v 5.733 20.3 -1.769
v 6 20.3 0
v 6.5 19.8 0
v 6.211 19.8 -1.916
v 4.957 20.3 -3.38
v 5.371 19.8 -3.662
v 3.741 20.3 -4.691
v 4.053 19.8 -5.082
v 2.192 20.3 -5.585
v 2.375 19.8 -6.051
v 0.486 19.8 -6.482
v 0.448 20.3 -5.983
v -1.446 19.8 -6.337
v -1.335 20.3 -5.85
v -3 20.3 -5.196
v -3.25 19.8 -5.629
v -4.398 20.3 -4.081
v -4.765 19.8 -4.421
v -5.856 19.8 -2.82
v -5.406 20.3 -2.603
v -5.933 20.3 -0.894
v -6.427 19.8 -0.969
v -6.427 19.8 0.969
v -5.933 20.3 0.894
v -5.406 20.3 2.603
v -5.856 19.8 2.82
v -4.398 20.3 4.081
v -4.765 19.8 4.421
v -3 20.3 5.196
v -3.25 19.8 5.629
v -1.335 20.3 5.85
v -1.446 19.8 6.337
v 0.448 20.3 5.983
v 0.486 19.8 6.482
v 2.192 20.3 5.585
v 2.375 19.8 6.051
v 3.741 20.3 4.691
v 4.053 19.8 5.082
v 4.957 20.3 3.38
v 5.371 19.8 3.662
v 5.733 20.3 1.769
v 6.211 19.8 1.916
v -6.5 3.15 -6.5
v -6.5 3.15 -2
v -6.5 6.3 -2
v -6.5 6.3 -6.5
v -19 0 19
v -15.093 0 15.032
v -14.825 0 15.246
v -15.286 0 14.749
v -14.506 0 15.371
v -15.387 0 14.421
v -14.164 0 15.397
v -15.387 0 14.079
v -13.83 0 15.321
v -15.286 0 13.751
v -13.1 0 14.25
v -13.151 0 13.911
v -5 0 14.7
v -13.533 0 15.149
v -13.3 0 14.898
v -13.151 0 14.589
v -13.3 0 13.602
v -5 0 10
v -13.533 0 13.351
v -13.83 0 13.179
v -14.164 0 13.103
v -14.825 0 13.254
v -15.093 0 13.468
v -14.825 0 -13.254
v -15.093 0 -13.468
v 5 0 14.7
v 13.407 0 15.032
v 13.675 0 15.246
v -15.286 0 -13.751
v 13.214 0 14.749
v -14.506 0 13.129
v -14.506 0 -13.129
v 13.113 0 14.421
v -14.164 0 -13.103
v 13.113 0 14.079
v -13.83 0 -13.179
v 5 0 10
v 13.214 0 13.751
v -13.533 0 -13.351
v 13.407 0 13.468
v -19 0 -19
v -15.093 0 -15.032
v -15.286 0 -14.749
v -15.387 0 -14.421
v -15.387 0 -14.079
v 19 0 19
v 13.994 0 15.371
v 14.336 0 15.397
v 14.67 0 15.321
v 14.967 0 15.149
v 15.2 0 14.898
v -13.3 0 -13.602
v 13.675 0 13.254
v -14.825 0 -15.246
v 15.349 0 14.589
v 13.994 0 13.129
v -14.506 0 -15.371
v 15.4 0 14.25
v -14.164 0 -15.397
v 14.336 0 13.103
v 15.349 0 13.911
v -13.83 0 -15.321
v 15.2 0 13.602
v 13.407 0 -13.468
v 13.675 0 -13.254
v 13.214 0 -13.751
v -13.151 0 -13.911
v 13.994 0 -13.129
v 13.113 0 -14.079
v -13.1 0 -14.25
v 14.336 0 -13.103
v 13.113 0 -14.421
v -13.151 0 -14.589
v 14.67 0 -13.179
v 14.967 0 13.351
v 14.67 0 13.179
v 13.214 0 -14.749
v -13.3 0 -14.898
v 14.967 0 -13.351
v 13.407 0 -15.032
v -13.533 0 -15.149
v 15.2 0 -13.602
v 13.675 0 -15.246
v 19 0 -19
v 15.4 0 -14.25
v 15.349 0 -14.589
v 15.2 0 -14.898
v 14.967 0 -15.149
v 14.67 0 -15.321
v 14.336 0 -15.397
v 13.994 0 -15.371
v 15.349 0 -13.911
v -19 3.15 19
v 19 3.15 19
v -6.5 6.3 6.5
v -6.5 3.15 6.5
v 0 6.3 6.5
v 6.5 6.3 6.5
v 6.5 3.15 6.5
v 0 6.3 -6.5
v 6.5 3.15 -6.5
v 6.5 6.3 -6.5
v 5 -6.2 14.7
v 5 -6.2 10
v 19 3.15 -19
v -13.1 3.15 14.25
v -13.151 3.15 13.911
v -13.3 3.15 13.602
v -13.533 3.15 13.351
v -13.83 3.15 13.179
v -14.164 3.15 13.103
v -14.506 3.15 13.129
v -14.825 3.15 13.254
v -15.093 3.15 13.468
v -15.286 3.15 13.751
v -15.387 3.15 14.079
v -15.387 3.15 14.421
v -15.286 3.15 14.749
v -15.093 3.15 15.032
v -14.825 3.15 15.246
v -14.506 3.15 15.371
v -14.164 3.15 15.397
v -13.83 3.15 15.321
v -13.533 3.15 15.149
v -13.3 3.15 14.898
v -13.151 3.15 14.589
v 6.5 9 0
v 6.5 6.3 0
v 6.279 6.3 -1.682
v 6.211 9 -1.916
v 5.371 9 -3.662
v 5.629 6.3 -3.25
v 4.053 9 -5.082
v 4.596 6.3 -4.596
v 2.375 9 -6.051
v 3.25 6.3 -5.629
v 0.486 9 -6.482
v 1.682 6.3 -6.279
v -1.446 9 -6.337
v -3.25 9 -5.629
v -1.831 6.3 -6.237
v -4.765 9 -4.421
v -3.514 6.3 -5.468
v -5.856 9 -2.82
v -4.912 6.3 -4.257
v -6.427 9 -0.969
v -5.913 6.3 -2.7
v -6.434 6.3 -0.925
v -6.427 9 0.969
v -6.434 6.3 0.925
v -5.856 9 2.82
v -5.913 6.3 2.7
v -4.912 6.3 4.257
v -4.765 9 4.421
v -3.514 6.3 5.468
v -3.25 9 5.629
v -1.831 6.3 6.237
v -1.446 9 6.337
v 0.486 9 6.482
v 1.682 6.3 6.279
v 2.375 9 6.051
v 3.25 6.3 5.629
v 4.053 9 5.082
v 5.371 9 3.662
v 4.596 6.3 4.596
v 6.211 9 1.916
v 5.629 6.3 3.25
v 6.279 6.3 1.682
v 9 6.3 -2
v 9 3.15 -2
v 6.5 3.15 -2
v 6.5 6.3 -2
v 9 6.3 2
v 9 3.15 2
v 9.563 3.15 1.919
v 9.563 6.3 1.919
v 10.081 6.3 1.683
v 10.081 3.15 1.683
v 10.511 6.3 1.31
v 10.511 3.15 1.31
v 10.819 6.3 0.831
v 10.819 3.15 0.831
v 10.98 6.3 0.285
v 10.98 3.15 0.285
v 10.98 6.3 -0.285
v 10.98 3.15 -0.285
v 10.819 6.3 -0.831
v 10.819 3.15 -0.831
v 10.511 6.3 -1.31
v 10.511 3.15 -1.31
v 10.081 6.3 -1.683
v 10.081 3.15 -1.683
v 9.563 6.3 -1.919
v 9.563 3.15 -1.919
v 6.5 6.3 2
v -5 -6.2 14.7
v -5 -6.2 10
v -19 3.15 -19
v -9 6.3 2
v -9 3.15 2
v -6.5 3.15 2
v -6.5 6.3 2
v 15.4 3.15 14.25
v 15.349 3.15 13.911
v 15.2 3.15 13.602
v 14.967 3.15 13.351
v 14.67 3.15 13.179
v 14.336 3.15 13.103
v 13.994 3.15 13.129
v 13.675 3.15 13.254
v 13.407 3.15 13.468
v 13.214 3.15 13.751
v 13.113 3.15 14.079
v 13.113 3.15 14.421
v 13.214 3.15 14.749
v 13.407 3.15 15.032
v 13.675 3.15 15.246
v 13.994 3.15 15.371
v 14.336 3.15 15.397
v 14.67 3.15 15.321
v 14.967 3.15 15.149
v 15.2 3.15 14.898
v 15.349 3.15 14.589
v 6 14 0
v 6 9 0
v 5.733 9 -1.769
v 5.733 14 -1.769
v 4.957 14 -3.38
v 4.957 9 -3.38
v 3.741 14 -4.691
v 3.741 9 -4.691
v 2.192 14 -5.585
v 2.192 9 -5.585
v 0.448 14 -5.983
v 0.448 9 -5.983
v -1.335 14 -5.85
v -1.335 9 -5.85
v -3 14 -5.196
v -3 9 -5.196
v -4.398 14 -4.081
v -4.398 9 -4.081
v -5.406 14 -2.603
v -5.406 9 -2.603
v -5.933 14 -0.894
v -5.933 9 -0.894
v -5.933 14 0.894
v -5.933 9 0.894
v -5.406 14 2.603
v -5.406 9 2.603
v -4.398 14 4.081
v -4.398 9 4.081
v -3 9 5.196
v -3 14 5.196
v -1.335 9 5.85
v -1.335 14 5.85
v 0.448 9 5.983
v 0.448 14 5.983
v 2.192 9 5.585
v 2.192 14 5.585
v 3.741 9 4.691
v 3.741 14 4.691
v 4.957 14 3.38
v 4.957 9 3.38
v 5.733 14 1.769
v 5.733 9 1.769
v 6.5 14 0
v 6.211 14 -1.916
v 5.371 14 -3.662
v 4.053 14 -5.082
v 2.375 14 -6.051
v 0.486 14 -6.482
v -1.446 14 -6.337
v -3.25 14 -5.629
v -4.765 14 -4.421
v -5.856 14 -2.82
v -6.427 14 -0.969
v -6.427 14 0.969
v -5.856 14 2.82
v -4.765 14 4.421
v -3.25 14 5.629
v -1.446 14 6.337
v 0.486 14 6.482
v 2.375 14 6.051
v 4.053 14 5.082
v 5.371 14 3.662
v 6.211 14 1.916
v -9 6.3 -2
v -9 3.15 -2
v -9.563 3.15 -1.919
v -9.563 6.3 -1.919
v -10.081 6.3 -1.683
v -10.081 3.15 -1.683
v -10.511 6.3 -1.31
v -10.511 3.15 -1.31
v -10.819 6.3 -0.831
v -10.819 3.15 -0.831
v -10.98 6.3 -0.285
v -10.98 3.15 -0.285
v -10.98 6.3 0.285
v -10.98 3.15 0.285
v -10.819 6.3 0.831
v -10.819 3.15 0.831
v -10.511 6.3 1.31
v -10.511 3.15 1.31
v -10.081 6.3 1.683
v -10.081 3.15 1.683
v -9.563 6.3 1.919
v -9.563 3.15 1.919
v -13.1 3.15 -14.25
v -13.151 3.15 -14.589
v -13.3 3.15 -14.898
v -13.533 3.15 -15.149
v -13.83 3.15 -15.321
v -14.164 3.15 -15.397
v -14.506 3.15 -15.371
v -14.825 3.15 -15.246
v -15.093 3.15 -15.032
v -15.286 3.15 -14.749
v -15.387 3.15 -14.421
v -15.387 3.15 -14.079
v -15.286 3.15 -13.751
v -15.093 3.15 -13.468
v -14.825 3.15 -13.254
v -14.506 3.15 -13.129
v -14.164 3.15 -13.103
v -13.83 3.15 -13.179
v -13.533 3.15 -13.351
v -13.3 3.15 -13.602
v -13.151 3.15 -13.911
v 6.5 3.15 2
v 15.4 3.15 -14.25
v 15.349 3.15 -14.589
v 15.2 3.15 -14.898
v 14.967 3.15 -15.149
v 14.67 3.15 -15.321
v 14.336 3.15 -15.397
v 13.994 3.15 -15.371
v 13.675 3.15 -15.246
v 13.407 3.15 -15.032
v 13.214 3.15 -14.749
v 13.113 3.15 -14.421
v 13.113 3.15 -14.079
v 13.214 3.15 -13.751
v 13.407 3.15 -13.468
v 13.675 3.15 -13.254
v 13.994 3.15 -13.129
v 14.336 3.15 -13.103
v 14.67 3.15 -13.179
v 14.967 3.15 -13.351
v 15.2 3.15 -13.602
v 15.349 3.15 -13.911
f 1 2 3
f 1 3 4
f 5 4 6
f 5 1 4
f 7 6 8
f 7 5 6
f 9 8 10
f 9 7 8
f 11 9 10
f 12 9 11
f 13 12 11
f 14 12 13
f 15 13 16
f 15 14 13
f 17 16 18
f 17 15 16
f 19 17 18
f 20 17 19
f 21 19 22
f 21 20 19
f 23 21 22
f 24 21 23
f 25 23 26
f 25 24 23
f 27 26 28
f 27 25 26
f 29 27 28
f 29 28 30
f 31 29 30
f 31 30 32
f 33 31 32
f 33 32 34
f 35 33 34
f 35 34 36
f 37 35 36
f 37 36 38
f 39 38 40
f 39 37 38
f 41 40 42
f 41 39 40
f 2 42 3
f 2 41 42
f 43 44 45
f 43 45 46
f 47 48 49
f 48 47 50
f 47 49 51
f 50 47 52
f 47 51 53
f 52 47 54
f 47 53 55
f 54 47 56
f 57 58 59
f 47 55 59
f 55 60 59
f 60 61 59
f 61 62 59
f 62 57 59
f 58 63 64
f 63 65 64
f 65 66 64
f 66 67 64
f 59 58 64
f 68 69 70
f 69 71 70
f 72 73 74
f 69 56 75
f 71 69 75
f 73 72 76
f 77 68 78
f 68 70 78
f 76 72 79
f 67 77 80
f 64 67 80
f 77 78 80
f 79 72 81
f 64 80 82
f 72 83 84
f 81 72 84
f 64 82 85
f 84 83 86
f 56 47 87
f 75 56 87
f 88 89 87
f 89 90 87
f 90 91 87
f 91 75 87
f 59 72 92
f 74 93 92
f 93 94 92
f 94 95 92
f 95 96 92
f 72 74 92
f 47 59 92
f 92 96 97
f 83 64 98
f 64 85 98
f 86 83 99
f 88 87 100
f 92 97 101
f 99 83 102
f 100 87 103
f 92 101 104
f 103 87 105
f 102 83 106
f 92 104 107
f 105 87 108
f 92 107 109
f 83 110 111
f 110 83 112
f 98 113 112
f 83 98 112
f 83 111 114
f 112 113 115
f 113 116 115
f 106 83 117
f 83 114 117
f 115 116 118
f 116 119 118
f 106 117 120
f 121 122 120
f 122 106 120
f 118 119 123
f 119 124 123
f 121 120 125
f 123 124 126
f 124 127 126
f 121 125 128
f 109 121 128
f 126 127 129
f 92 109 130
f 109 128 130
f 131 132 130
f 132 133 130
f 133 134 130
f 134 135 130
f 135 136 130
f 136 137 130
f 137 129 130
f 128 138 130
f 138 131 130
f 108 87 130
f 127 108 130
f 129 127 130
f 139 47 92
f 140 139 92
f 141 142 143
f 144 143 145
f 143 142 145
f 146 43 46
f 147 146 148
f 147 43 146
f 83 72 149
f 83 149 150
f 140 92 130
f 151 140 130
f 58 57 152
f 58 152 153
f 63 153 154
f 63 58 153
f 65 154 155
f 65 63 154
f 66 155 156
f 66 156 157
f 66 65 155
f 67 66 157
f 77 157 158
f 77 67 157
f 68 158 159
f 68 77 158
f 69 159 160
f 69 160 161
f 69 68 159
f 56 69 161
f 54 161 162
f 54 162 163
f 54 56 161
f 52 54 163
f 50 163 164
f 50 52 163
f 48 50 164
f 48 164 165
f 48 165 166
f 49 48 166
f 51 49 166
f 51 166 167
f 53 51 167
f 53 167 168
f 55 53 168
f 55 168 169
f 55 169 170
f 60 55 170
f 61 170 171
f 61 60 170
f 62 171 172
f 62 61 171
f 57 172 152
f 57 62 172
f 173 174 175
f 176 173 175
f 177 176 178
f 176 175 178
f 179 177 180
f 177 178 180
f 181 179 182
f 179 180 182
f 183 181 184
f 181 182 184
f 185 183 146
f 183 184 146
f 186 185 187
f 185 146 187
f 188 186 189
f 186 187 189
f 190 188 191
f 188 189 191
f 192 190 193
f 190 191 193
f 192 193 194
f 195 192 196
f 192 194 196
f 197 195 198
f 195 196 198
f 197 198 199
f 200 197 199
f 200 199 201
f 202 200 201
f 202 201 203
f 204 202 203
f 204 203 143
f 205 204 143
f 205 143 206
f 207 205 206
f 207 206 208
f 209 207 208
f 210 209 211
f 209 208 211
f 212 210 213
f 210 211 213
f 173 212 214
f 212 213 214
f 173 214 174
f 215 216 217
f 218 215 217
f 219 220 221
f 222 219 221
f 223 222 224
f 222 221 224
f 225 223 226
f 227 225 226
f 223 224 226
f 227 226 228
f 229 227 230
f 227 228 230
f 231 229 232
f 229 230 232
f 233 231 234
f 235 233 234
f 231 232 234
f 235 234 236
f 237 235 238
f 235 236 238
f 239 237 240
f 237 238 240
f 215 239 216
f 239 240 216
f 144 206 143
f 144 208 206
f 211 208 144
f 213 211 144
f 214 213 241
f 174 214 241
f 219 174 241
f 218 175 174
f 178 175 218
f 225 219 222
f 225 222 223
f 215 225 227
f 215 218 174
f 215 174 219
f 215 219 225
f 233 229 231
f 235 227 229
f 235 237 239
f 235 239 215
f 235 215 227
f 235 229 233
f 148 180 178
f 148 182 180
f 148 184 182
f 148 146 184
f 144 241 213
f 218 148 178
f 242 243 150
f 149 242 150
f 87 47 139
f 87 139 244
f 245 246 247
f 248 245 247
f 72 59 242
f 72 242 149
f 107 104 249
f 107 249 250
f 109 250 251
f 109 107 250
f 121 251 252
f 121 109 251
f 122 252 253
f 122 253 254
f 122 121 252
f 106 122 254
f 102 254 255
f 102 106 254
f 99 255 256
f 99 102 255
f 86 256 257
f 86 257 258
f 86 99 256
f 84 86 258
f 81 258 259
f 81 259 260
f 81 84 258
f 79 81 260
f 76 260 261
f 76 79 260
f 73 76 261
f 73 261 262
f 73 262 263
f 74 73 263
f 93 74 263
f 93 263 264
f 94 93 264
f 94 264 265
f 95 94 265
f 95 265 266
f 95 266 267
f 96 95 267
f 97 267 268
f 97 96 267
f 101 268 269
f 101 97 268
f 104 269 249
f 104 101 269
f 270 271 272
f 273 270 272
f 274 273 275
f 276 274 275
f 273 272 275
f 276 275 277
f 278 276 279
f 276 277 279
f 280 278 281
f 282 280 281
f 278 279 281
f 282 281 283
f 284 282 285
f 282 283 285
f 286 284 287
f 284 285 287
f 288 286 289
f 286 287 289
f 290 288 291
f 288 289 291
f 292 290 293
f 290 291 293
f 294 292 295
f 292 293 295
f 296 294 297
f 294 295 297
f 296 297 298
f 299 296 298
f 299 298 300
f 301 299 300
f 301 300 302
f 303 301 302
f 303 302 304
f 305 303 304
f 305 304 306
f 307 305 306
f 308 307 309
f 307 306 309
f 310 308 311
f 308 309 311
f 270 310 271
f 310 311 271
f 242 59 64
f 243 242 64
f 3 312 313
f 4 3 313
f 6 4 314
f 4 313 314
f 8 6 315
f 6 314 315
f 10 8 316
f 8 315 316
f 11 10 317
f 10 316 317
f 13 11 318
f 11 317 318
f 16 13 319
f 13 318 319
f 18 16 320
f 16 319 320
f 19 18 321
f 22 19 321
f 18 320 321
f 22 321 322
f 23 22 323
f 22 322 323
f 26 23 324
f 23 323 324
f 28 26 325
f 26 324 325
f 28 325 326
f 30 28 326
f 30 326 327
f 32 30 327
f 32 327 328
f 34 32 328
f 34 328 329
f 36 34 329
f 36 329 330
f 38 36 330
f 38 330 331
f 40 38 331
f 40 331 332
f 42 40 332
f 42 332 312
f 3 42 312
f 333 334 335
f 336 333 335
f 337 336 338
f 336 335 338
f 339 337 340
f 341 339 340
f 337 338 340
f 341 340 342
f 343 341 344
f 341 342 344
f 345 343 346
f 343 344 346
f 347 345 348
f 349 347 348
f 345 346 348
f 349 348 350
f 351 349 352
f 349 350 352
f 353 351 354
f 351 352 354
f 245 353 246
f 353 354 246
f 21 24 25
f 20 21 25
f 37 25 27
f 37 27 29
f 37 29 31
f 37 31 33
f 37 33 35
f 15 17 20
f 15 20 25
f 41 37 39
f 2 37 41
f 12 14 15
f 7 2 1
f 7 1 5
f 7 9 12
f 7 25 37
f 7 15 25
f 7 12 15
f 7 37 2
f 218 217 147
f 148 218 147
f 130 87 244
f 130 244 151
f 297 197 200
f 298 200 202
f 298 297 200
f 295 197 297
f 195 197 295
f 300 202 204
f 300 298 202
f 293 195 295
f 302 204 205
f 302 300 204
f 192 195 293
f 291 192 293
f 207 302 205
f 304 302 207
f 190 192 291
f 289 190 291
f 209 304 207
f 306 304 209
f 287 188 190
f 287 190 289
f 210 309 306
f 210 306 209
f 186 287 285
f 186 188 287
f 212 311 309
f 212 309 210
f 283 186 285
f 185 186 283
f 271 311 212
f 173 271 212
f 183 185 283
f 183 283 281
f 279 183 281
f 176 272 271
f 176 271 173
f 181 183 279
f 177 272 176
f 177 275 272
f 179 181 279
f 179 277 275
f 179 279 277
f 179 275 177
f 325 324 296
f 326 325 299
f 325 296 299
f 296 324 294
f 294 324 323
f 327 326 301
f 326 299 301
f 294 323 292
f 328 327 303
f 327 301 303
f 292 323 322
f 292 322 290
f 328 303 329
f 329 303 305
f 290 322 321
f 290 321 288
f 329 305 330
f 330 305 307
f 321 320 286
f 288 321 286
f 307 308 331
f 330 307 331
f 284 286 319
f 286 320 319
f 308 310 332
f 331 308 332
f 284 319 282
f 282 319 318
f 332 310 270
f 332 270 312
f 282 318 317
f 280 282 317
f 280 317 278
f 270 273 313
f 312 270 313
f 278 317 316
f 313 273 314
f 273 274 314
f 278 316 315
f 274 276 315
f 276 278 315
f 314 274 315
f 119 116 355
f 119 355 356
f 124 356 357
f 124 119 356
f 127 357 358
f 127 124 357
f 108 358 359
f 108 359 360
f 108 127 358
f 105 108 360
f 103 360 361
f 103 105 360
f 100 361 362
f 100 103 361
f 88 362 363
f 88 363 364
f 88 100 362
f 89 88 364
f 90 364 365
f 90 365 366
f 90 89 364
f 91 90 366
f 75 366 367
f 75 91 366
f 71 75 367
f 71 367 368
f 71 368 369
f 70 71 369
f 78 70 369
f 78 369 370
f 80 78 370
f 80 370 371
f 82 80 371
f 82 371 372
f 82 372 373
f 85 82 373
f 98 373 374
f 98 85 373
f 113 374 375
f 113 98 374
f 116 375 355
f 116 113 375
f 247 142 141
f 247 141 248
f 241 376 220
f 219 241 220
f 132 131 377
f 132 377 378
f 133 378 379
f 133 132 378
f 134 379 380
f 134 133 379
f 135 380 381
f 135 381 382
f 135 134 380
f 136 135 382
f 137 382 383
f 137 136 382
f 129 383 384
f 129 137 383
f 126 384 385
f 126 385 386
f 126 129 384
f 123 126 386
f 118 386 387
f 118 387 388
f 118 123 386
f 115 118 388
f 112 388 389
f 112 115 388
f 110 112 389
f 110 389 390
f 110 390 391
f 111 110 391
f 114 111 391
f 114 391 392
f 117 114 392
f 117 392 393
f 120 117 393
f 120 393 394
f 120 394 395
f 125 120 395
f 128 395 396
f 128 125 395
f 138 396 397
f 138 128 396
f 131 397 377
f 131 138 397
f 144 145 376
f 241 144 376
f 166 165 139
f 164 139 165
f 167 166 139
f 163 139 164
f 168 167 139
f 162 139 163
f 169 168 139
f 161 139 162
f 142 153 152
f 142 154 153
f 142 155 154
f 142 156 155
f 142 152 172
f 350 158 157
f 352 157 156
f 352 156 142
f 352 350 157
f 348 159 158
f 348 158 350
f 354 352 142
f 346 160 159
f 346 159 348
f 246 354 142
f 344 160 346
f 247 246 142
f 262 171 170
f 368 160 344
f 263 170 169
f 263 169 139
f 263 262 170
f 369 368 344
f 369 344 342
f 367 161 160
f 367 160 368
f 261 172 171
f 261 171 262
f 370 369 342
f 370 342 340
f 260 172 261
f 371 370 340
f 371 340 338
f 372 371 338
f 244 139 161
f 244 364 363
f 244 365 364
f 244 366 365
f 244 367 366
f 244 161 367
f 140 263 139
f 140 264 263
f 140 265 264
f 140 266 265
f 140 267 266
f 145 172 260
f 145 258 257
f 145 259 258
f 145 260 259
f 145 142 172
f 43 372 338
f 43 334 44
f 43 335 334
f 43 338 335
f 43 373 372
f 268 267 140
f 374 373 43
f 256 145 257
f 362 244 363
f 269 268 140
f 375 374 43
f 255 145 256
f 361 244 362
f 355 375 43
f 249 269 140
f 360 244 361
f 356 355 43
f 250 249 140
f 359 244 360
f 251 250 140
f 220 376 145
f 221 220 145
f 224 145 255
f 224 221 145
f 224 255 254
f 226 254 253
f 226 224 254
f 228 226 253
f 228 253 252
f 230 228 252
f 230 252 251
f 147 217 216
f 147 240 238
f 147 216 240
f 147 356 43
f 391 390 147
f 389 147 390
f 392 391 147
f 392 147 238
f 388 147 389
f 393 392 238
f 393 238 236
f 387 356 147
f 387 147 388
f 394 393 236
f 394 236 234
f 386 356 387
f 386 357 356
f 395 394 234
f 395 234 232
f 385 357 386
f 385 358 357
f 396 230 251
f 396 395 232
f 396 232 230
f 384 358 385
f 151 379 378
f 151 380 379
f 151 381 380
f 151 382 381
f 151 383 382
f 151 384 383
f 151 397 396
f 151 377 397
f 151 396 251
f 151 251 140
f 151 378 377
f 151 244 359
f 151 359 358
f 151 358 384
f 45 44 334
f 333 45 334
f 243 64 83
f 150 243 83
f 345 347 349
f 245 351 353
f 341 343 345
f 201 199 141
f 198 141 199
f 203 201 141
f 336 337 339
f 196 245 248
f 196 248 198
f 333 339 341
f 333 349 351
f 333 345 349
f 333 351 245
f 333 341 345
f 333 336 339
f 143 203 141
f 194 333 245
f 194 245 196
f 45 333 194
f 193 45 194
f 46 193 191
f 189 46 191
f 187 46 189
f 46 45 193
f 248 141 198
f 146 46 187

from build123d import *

# Parameters (mm, degrees)
SKETCH_2_W          = 38
SKETCH_2_H          = 38
SKETCH_2_R          = 1.15
EXTRUDE_1_DEPTH     = 3.15
EXTRUDE_START       = 3.15
SKETCH_3_W          = 13
SKETCH_3_H          = 13
EXTRUDE_2_DEPTH     = 3.15
EXTRUDE_START_2     = 6.3
SKETCH_4_R          = 6.5
EXTRUDE_3_DEPTH     = 14
CUT_EXTRUDE_START   = 9
SKETCH_5_R          = 32.561017026
SKETCH_5_R_2        = 6
CUT_EXTRUDE_1_DEPTH = 5
SKETCH_6_W          = 10
SKETCH_6_H          = 4.7
EXTRUDE_4_DEPTH     = 6.2
CHAMFER_1_SIZE      = 0.5


with BuildPart() as part:
    # 草图2 → 凸台-拉伸1 (new body)
    with BuildSketch(Plane(origin=(0, 0, 0), x_dir=(1, 0, 0), z_dir=(0, 1, 0))):
        Rectangle(SKETCH_2_W, SKETCH_2_H)
        with Locations((14.25, 14.25)):
            Circle(SKETCH_2_R, mode=Mode.SUBTRACT)
        with Locations((-14.25, 14.25)):
            Circle(SKETCH_2_R, mode=Mode.SUBTRACT)
        with Locations((14.25, -14.25)):
            Circle(SKETCH_2_R, mode=Mode.SUBTRACT)
        with Locations((-14.25, -14.25)):
            Circle(SKETCH_2_R, mode=Mode.SUBTRACT)
    extrude(amount=EXTRUDE_1_DEPTH)

    # 草图3 → 凸台-拉伸2 (add)
    with BuildSketch(Plane(origin=(0, 0, 0), x_dir=(1, 0, 0), z_dir=(0, 1, 0)).offset(EXTRUDE_START)):
        with BuildLine():
            Line((-6.5, -2), (-6.5, 2))
            Line((-6.5, 2), (-9, 2))
            ThreePointArc((-9, 2), (-11, 0), (-9, -2))
            Line((-9, -2), (-6.5, -2))
        make_face()
        Rectangle(SKETCH_3_W, SKETCH_3_H)
        with BuildLine():
            ThreePointArc((9, -2), (11, 0), (9, 2))
            Line((9, 2), (6.5, 2))
            Line((6.5, 2), (6.5, -2))
            Line((6.5, -2), (9, -2))
        make_face()
    extrude(amount=EXTRUDE_2_DEPTH)

    # 草图4 → 凸台-拉伸3 (add)
    with BuildSketch(Plane(origin=(0, 0, 0), x_dir=(1, 0, 0), z_dir=(0, 1, 0)).offset(EXTRUDE_START_2)):
        Circle(SKETCH_4_R)
    extrude(amount=EXTRUDE_3_DEPTH)

    # 草图5 → 切除-拉伸1 (cut)
    with BuildSketch(Plane(origin=(0, 0, 0), x_dir=(1, 0, 0), z_dir=(0, 1, 0)).offset(CUT_EXTRUDE_START)):
        Circle(SKETCH_5_R)
        Circle(SKETCH_5_R_2, mode=Mode.SUBTRACT)
    extrude(amount=CUT_EXTRUDE_1_DEPTH, mode=Mode.SUBTRACT)

    # 草图6 → 凸台-拉伸4 (add)
    with BuildSketch(Plane(origin=(0, 0, 0), x_dir=(1, 0, 0), z_dir=(0, 1, 0))):
        with Locations((0, -12.35)):
            Rectangle(SKETCH_6_W, SKETCH_6_H)
    extrude(amount=-EXTRUDE_4_DEPTH)

    # 倒角1
    chamfer_1_edges = [part.edges().sort_by_distance(p)[0] for p in [
        (-6.5, 20.3, 0),
    ]]
    chamfer(chamfer_1_edges, length=CHAMFER_1_SIZE)


solid = part.part
